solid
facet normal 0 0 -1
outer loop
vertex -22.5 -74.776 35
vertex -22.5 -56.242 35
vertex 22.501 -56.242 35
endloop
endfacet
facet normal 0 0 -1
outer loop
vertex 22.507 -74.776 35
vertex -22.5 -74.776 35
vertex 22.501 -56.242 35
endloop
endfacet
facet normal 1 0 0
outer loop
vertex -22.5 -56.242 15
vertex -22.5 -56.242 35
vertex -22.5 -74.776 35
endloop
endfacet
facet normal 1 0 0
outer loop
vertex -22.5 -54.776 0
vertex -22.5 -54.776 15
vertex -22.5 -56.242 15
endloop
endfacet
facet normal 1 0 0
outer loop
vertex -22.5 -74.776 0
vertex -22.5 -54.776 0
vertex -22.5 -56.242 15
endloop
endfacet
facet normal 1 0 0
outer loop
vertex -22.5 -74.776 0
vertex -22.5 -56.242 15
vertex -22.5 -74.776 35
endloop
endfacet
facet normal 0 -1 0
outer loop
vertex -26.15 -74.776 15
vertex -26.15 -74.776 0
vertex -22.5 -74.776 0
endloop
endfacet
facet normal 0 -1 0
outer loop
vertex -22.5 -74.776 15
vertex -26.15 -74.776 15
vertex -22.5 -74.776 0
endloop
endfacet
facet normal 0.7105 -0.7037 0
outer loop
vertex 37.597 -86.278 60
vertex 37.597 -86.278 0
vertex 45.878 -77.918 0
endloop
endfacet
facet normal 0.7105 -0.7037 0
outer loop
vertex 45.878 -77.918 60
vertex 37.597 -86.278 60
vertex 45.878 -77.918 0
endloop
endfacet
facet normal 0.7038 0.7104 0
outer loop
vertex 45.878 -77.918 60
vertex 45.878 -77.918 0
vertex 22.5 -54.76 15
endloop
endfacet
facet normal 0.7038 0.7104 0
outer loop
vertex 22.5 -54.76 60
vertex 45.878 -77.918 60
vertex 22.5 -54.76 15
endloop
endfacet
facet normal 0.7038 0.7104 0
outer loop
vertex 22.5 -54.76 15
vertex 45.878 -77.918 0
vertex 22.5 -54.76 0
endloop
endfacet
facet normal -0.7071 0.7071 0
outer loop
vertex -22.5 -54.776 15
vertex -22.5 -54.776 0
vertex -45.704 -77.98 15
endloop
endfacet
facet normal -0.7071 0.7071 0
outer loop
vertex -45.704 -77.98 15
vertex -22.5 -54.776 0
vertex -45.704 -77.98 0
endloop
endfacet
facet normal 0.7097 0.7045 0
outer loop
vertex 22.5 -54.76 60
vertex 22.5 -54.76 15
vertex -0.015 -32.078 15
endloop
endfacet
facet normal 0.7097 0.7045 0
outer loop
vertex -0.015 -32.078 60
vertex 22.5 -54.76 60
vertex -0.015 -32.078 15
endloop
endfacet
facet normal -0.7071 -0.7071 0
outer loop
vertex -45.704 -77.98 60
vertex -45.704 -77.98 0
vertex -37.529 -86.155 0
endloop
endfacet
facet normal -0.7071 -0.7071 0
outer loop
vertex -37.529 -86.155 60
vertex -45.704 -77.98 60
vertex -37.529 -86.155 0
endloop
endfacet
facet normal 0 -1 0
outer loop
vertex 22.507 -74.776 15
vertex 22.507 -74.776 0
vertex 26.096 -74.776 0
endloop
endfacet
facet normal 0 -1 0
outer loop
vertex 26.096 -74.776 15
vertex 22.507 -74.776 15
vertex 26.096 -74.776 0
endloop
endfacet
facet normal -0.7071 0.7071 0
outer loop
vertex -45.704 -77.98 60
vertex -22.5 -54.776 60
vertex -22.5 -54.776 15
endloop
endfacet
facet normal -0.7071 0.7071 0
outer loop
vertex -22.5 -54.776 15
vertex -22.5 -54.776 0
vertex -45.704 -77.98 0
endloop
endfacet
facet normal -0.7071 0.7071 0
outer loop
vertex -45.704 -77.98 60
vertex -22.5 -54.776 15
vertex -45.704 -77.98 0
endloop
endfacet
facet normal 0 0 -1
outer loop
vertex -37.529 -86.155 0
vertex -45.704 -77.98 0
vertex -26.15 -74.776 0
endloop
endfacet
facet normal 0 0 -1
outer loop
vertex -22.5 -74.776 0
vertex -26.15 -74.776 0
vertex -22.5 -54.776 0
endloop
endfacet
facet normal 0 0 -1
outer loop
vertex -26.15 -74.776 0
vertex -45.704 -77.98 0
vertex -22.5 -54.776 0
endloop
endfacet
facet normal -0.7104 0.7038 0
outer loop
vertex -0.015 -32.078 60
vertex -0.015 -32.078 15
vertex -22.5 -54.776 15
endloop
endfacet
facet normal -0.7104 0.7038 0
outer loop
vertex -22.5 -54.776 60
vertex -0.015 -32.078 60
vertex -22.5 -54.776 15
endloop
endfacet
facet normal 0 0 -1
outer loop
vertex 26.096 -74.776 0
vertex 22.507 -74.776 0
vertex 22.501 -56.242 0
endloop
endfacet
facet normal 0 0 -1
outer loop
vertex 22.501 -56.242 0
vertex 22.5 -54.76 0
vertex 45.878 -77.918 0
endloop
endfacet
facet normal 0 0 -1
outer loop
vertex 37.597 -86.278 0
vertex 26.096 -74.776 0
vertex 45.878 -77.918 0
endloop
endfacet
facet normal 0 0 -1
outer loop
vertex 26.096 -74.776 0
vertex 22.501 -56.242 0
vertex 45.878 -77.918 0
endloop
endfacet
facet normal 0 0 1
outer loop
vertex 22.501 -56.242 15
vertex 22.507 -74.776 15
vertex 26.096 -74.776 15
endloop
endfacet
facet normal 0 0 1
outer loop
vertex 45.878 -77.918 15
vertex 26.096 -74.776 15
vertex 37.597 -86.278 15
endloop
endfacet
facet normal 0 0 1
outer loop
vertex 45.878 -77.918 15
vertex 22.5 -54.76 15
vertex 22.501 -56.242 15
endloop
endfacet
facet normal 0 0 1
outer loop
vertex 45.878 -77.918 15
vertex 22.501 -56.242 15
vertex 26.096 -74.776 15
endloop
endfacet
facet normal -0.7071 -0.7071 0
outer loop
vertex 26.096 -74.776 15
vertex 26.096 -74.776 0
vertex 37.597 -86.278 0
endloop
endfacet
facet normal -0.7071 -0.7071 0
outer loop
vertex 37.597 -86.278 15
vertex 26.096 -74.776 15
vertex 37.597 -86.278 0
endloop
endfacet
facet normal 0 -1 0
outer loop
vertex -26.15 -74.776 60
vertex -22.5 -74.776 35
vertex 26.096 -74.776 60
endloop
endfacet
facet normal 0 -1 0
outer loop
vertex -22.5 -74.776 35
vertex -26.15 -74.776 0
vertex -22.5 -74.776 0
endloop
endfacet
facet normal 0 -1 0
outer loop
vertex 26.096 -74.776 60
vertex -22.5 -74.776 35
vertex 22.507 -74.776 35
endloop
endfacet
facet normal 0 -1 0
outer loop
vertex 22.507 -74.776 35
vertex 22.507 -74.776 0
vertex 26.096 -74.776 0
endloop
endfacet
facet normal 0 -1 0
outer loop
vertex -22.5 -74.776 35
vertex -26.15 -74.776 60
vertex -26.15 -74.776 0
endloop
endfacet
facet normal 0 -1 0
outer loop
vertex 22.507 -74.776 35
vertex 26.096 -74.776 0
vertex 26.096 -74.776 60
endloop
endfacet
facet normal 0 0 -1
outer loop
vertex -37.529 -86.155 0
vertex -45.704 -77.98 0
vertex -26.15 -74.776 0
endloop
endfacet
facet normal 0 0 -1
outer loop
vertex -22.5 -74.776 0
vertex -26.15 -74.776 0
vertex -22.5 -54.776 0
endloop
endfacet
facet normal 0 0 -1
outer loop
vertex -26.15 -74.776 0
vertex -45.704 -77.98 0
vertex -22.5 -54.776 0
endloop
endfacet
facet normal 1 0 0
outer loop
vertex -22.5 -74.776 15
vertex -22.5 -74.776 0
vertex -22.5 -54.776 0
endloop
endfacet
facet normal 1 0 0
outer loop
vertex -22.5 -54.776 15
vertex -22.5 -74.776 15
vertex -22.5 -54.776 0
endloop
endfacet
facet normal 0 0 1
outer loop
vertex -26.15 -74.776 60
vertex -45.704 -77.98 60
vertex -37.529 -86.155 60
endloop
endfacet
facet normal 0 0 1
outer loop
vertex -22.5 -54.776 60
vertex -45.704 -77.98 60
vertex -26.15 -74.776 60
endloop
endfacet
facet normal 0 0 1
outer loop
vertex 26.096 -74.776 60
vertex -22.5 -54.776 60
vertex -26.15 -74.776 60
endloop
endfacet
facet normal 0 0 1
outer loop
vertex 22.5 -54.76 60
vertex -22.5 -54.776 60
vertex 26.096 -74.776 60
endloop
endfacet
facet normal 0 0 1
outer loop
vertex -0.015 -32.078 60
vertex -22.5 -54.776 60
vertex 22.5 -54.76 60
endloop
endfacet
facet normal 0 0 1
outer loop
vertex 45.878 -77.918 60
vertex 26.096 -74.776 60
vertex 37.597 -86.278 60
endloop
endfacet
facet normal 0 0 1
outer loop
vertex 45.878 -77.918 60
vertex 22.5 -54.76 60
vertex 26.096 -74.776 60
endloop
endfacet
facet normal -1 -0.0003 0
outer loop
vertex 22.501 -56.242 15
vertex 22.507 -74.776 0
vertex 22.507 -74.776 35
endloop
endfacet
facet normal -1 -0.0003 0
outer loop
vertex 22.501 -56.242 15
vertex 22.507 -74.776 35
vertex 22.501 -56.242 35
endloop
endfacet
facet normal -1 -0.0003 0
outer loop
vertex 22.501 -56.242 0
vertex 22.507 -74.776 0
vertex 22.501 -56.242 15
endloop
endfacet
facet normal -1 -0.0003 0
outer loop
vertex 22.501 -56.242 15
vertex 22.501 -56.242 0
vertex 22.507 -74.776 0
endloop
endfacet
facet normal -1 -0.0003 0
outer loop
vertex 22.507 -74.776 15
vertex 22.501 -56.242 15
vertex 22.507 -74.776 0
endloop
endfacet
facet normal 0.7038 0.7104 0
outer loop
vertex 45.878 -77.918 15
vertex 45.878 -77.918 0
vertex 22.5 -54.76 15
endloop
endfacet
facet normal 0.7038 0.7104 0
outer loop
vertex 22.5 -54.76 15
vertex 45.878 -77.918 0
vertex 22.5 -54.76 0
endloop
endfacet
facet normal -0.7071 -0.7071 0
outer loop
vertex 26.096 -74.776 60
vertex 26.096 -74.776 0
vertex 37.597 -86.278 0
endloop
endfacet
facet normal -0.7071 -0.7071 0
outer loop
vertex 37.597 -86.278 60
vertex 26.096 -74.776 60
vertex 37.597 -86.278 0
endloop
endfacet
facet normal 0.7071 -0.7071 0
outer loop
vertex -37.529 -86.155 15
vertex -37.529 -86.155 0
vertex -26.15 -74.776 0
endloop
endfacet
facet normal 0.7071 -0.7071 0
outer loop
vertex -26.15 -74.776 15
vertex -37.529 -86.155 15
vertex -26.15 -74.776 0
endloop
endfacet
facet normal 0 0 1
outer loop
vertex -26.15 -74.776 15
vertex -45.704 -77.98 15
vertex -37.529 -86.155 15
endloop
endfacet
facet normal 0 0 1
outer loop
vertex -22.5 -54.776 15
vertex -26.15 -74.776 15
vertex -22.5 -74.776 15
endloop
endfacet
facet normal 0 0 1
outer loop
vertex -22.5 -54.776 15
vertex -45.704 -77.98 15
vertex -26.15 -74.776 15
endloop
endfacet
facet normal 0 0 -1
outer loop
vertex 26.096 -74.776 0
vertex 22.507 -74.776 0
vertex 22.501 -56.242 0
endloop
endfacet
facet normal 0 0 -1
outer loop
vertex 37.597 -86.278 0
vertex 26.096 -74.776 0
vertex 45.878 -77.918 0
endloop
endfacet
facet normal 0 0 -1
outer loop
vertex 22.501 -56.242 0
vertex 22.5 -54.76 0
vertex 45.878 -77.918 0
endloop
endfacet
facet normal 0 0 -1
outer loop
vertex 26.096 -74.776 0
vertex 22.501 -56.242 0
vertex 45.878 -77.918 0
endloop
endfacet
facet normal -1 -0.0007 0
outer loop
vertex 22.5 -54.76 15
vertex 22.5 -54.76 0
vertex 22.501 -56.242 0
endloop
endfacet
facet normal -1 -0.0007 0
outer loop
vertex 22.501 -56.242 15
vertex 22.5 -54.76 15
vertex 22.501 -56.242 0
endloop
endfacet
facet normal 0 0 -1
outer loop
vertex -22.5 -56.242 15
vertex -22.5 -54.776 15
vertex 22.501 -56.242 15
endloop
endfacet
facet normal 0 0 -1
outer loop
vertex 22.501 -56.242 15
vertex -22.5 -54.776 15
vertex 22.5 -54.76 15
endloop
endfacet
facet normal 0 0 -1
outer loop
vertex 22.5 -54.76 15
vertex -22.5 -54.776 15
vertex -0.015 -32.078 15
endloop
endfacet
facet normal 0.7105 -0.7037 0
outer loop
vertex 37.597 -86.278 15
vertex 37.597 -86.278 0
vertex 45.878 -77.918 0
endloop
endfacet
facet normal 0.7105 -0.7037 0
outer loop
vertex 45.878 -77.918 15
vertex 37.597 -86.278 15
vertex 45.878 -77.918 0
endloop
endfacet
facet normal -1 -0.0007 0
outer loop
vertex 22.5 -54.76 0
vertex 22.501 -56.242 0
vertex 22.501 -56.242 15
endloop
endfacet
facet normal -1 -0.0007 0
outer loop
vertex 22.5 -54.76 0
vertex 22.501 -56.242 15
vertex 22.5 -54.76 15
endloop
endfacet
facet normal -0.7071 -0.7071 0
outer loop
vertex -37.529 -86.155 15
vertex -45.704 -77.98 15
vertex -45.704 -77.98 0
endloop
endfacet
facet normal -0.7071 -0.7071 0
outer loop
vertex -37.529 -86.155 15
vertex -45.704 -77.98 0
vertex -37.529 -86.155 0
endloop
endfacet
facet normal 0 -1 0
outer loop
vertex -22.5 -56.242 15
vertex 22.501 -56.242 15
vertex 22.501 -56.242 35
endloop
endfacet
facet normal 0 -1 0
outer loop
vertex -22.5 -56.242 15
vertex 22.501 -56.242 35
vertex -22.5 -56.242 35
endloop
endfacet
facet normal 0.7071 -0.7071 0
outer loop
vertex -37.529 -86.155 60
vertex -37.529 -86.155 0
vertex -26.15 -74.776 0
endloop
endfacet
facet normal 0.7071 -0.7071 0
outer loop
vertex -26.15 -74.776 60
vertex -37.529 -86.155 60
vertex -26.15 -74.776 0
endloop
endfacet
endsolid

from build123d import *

# Parameters (mm, degrees)
F1_DEPTH = 15
F2_DEPTH = 60
F3_DEPTH = 35
F4_DEPTH = 15


with BuildPart() as f1:
    # F0 (on Top) → F1 (new body)
    with BuildSketch(Plane.XY):
        Polygon((-45.7041380099, -77.9803808107), (-37.5291732437, -86.155345577), (-26.1500704675, -74.7762428008), (-22.5, -74.7762428008), (-22.5, -56.2421455979), (-22.5, -54.7762428008), align=None)
    extrude(amount=F1_DEPTH)


with BuildPart() as f1b:
    # F0 (on Top) → F1, piece 2 (new body)
    with BuildSketch(Plane.XY):
        Polygon((26.0955594839, -74.7762428008), (37.5969056221, -86.277588939), (45.8779636159, -77.9177674474), (22.4999970904, -54.7600604596), (22.5005300594, -56.2421455979), (22.5071950618, -74.7762428008), align=None)
    extrude(amount=F1_DEPTH)


with BuildPart() as f2:
    # F0 (on Top) → F2 (new body)
    with BuildSketch(Plane.XY):
        Polygon((-45.7041380099, -77.9803808107), (-37.5291732437, -86.155345577), (-26.1500704675, -74.7762428008), (-22.5, -74.7762428008), (-22.5, -56.2421455979), (-22.5, -54.7762428008), align=None)
        Polygon((-22.5, -56.2421455979), (-22.5, -74.7762428008), (0, -74.7762428008), (-0.0066650023, -56.2421455979), align=None)
        Polygon((0, -74.7762428008), (22.5071950618, -74.7762428008), (22.5005300594, -56.2421455979), (-0.0066650023, -56.2421455979), align=None)
        Polygon((26.0955594839, -74.7762428008), (37.5969056221, -86.277588939), (45.8779636159, -77.9177674474), (22.4999970904, -54.7600604596), (22.5005300594, -56.2421455979), (22.5071950618, -74.7762428008), align=None)
        Polygon((-0.0071950608, -54.7681542171), (-22.5, -54.7762428008), (-22.5, -56.2421455979), (-0.0066650023, -56.2421455979), align=None)
        Polygon((22.5005300594, -56.2421455979), (22.4999970904, -54.7600604596), (-0.0071950608, -54.7681542171), (-0.0066650023, -56.2421455979), align=None)
        Polygon((-0.0153547065, -32.0777396508), (-22.5, -54.7762428008), (-0.0071950608, -54.7681542171), align=None)
        Polygon((-0.0071950608, -54.7681542171), (22.4999970904, -54.7600604596), (-0.0153547065, -32.0777396508), align=None)
    extrude(amount=F2_DEPTH)

    # F0 (on Top) → F3 (cut)
    with BuildSketch(Plane.XY):
        Polygon((-22.5, -56.2421455979), (-22.5, -74.7762428008), (0, -74.7762428008), (-0.0066650023, -56.2421455979), align=None)
        Polygon((0, -74.7762428008), (22.5071950618, -74.7762428008), (22.5005300594, -56.2421455979), (-0.0066650023, -56.2421455979), align=None)
    extrude(amount=F3_DEPTH, mode=Mode.SUBTRACT)

    # F0 (on Top) → F4 (cut)
    with BuildSketch(Plane.XY):
        Polygon((-0.0071950608, -54.7681542171), (-22.5, -54.7762428008), (-22.5, -56.2421455979), (-0.0066650023, -56.2421455979), align=None)
        Polygon((22.5005300594, -56.2421455979), (22.4999970904, -54.7600604596), (-0.0071950608, -54.7681542171), (-0.0066650023, -56.2421455979), align=None)
        Polygon((-0.0071950608, -54.7681542171), (22.4999970904, -54.7600604596), (-0.0153547065, -32.0777396508), align=None)
        Polygon((-0.0153547065, -32.0777396508), (-22.5, -54.7762428008), (-0.0071950608, -54.7681542171), align=None)
    extrude(amount=F4_DEPTH, mode=Mode.SUBTRACT)


solid = Compound([f1.part, f1b.part, f2.part])
